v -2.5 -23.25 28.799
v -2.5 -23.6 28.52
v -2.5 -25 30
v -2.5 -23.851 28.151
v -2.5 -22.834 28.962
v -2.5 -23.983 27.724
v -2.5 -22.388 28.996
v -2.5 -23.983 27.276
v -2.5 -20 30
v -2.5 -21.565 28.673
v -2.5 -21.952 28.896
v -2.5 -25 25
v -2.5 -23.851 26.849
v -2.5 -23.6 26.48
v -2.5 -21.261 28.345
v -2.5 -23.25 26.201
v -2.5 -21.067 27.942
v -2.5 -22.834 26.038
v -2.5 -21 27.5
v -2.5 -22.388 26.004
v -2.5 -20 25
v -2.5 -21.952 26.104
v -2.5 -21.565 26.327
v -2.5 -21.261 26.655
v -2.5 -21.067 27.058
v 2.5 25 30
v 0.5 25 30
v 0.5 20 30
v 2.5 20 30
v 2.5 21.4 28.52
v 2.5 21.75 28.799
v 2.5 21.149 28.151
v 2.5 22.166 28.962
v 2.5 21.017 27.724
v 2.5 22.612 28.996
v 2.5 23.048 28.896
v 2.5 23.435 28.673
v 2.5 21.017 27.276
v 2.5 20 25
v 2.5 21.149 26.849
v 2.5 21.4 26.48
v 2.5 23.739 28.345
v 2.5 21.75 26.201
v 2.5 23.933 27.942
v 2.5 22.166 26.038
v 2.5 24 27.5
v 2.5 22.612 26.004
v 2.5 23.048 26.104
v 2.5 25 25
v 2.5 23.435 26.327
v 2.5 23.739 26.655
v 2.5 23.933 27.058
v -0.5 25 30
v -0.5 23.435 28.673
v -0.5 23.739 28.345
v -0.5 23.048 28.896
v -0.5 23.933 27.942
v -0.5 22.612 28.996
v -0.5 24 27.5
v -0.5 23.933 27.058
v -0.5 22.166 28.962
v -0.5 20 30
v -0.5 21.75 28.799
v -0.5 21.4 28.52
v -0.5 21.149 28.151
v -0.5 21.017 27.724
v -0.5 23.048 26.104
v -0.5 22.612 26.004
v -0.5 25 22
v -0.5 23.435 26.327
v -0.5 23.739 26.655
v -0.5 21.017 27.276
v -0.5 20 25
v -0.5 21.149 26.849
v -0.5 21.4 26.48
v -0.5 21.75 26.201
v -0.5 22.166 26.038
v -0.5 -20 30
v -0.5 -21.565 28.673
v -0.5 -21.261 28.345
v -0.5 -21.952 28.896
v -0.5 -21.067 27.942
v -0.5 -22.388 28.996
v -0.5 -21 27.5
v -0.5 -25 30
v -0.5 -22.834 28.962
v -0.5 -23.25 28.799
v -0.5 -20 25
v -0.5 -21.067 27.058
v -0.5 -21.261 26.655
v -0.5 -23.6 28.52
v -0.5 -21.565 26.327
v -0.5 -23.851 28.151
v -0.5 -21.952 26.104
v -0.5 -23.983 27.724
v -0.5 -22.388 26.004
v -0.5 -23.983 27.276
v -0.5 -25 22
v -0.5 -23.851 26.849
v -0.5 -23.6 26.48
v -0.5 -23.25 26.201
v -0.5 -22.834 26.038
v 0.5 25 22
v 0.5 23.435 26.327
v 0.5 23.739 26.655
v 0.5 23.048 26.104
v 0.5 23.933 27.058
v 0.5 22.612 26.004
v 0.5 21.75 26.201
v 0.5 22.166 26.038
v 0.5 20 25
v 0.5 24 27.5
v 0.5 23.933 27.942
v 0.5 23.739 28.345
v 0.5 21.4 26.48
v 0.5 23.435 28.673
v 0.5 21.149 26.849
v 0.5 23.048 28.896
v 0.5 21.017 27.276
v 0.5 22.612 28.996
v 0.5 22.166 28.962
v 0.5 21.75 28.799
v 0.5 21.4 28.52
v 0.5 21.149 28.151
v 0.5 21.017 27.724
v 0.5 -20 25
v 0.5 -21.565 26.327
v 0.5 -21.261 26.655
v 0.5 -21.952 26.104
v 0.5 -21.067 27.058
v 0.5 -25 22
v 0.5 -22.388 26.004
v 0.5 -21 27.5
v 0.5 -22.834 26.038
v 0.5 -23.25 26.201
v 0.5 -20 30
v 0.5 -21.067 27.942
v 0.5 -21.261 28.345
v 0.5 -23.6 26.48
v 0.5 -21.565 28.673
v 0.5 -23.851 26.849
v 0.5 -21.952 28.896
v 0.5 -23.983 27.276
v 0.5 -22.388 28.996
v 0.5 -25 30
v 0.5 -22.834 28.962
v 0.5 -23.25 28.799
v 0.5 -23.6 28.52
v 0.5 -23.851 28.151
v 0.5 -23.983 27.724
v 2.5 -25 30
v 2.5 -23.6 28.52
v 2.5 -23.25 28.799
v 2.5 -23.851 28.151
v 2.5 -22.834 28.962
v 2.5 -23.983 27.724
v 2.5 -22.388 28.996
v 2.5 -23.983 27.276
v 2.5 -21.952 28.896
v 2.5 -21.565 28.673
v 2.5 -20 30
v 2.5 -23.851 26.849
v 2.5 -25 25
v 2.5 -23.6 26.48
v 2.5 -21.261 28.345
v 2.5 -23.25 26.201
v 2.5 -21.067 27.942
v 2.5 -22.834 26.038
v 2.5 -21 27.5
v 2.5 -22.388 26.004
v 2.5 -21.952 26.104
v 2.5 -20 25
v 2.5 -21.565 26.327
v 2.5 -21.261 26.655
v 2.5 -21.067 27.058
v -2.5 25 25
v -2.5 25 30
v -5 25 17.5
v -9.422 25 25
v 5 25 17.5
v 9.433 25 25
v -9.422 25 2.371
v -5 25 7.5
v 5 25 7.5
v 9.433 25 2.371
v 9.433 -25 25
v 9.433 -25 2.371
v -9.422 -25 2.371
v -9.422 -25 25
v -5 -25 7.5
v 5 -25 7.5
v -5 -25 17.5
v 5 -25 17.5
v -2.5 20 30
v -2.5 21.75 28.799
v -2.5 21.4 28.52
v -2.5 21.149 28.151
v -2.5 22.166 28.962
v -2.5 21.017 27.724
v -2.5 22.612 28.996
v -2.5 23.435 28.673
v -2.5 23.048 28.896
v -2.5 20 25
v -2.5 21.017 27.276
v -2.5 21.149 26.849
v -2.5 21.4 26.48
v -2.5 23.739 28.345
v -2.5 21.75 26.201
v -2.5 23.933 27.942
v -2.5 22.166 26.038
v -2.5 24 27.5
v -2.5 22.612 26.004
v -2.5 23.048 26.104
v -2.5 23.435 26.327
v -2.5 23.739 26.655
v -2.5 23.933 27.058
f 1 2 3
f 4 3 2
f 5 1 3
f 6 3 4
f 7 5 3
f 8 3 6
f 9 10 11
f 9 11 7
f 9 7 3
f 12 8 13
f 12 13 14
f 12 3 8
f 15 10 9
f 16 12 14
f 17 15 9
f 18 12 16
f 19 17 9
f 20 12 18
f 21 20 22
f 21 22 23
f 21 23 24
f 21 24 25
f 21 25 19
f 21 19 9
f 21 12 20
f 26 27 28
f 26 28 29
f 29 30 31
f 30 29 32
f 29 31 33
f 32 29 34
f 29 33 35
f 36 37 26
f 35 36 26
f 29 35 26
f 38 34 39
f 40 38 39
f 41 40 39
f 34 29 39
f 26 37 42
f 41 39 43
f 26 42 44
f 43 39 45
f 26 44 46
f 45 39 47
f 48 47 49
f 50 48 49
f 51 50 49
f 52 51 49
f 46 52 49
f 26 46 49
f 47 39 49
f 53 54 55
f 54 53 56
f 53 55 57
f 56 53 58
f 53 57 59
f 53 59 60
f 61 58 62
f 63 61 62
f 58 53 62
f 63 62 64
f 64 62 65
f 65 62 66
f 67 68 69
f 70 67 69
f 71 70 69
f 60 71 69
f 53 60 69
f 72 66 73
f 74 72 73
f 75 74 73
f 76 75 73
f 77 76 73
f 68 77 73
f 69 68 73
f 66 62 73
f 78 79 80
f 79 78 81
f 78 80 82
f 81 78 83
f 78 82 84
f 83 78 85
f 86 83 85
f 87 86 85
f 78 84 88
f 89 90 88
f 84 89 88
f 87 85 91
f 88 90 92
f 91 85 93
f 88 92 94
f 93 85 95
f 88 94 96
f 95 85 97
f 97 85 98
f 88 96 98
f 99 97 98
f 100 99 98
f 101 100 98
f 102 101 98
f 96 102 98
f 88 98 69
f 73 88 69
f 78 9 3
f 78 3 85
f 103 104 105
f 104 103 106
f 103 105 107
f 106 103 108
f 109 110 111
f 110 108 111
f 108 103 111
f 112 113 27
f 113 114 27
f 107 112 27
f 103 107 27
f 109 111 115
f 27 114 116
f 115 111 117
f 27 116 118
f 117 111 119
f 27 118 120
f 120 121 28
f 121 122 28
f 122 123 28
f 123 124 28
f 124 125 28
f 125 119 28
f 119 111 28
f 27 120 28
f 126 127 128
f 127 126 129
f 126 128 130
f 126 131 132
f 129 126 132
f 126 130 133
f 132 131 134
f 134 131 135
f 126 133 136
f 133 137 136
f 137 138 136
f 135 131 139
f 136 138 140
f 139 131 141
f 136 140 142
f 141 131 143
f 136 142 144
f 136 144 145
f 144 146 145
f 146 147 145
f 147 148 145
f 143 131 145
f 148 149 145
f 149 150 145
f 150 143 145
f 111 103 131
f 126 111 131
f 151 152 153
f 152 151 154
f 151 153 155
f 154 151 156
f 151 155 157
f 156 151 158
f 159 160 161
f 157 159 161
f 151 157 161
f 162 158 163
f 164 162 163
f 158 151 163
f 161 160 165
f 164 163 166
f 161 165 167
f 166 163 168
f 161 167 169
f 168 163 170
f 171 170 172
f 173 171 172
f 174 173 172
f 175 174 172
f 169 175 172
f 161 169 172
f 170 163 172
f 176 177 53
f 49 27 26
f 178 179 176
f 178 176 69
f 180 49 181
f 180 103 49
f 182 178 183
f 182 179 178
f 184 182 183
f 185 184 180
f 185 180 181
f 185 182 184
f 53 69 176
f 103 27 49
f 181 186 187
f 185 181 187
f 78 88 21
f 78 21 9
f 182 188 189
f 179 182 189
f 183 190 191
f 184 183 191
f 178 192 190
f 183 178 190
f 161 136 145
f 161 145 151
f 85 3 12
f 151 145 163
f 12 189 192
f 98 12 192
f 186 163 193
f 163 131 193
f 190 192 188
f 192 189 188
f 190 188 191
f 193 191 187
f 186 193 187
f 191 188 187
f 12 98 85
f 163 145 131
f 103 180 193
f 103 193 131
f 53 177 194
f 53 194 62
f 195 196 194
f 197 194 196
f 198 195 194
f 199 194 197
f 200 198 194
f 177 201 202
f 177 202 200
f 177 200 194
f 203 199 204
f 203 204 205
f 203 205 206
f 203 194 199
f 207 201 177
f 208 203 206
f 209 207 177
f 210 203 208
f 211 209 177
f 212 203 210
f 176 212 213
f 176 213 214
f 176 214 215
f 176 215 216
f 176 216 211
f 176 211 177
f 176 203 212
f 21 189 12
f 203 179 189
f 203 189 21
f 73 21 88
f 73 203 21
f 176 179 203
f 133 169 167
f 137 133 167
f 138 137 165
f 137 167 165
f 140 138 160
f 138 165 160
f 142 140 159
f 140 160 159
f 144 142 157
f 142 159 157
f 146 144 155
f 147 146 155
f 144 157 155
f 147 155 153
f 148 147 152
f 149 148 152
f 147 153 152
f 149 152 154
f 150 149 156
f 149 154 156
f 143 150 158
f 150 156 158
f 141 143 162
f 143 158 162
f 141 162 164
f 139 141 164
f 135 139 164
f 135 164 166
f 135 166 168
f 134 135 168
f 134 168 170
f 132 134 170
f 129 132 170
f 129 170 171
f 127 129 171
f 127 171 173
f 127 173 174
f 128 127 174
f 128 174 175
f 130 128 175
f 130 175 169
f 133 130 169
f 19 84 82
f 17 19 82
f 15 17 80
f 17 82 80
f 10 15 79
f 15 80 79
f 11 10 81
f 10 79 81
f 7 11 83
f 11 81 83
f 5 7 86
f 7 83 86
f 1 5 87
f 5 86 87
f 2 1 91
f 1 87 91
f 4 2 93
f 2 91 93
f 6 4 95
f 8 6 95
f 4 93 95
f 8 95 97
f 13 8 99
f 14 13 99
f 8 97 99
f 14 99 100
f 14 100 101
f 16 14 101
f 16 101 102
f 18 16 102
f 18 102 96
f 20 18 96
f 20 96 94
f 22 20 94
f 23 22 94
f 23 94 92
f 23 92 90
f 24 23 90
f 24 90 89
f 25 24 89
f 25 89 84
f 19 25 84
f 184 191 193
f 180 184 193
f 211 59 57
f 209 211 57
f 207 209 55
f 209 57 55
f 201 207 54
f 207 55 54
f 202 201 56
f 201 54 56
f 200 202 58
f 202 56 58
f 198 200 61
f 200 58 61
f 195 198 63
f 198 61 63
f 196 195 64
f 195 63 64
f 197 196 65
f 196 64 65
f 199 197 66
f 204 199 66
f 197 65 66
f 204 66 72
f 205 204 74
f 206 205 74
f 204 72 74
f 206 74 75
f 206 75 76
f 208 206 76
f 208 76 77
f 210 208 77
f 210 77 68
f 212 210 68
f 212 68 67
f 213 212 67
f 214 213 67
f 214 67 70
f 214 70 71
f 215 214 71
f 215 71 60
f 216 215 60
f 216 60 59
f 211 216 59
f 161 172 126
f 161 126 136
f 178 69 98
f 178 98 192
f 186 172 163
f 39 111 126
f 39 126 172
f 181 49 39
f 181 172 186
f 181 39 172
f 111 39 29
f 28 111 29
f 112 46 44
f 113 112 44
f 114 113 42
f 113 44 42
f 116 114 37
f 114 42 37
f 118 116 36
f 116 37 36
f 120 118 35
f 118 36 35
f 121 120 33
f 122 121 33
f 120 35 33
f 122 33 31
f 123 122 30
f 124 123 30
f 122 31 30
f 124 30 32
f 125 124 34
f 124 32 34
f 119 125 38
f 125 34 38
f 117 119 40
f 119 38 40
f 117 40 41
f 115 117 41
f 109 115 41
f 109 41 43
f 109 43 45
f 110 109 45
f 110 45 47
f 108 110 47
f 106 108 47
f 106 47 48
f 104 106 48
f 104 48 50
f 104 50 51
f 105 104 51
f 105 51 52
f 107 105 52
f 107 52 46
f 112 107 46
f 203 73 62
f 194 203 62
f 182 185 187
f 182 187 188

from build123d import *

# Parameters (mm, degrees)
F0_W     = 26
F0_H     = 50
F1_DEPTH = 25
F3_W     = 5
F3_H     = 50
F4_DEPTH = 5
F5_R     = 1.5
F6_DEPTH = 25
F2_W     = 1
F2_H     = 8.4868058562
F7_DEPTH = 77.6
F8_W     = 40
F8_H     = 5
F9_DEPTH = 25


with BuildPart() as f1:
    # F0 (on Top) → F1 (new body)
    with BuildSketch(Plane.XY):
        Rectangle(F0_W, F0_H)
    extrude(amount=F1_DEPTH)

    # F3 (on face) → F4 (join)
    with BuildSketch(Plane.XY.offset(25)):
        Rectangle(F3_W, F3_H)
    extrude(amount=F4_DEPTH)

    # F5 (on face) → F6 (cut)
    with BuildSketch(Plane.YZ.offset(2.5)):
        with Locations((-22.5, 27.5)):
            Circle(F5_R)
        with Locations((22.5, 27.5)):
            Circle(F5_R)
    extrude(amount=-F6_DEPTH, mode=Mode.SUBTRACT)

    # F2 (on face) → F7 (cut)
    with BuildSketch(Plane.XZ.offset(25)):
        Polygon((-5, 7.5), (5, 7.5), (5, 17.5), (0.5, 17.5), (-0.5, 17.5), (-5, 17.5), align=None)
        Polygon((0.5, 17.5), (5, 17.5), (0.5, 22), align=None)
        Polygon((-0.5, 22), (-5, 17.5), (-0.5, 17.5), align=None)
        with Locations((0, 29.2434029281)):
            Rectangle(F2_W, F2_H)
        Polygon((-0.5, 17.5), (0.5, 17.5), (0.5, 22), (0.5, 25), (-0.5, 25), (-0.5, 22), align=None)
        Polygon((13, 25), (9.4331367873, 25), (9.4331367873, 2.3707551882), (9.4331367873, 0), (13, 0), align=None)
        Polygon((-9.4218887389, 2.3707551882), (-9.4218887389, 25), (-13, 25), (-13, 0), (9.4331367873, 0), (9.4331367873, 2.3707551882), align=None)
    extrude(amount=-F7_DEPTH, mode=Mode.SUBTRACT)

    # F8 (on face) → F9 (cut)
    with BuildSketch(Plane.YZ.offset(2.5)):
        with Locations((0, 27.5)):
            Rectangle(F8_W, F8_H)
    extrude(amount=-F9_DEPTH, mode=Mode.SUBTRACT)


solid = f1.part
